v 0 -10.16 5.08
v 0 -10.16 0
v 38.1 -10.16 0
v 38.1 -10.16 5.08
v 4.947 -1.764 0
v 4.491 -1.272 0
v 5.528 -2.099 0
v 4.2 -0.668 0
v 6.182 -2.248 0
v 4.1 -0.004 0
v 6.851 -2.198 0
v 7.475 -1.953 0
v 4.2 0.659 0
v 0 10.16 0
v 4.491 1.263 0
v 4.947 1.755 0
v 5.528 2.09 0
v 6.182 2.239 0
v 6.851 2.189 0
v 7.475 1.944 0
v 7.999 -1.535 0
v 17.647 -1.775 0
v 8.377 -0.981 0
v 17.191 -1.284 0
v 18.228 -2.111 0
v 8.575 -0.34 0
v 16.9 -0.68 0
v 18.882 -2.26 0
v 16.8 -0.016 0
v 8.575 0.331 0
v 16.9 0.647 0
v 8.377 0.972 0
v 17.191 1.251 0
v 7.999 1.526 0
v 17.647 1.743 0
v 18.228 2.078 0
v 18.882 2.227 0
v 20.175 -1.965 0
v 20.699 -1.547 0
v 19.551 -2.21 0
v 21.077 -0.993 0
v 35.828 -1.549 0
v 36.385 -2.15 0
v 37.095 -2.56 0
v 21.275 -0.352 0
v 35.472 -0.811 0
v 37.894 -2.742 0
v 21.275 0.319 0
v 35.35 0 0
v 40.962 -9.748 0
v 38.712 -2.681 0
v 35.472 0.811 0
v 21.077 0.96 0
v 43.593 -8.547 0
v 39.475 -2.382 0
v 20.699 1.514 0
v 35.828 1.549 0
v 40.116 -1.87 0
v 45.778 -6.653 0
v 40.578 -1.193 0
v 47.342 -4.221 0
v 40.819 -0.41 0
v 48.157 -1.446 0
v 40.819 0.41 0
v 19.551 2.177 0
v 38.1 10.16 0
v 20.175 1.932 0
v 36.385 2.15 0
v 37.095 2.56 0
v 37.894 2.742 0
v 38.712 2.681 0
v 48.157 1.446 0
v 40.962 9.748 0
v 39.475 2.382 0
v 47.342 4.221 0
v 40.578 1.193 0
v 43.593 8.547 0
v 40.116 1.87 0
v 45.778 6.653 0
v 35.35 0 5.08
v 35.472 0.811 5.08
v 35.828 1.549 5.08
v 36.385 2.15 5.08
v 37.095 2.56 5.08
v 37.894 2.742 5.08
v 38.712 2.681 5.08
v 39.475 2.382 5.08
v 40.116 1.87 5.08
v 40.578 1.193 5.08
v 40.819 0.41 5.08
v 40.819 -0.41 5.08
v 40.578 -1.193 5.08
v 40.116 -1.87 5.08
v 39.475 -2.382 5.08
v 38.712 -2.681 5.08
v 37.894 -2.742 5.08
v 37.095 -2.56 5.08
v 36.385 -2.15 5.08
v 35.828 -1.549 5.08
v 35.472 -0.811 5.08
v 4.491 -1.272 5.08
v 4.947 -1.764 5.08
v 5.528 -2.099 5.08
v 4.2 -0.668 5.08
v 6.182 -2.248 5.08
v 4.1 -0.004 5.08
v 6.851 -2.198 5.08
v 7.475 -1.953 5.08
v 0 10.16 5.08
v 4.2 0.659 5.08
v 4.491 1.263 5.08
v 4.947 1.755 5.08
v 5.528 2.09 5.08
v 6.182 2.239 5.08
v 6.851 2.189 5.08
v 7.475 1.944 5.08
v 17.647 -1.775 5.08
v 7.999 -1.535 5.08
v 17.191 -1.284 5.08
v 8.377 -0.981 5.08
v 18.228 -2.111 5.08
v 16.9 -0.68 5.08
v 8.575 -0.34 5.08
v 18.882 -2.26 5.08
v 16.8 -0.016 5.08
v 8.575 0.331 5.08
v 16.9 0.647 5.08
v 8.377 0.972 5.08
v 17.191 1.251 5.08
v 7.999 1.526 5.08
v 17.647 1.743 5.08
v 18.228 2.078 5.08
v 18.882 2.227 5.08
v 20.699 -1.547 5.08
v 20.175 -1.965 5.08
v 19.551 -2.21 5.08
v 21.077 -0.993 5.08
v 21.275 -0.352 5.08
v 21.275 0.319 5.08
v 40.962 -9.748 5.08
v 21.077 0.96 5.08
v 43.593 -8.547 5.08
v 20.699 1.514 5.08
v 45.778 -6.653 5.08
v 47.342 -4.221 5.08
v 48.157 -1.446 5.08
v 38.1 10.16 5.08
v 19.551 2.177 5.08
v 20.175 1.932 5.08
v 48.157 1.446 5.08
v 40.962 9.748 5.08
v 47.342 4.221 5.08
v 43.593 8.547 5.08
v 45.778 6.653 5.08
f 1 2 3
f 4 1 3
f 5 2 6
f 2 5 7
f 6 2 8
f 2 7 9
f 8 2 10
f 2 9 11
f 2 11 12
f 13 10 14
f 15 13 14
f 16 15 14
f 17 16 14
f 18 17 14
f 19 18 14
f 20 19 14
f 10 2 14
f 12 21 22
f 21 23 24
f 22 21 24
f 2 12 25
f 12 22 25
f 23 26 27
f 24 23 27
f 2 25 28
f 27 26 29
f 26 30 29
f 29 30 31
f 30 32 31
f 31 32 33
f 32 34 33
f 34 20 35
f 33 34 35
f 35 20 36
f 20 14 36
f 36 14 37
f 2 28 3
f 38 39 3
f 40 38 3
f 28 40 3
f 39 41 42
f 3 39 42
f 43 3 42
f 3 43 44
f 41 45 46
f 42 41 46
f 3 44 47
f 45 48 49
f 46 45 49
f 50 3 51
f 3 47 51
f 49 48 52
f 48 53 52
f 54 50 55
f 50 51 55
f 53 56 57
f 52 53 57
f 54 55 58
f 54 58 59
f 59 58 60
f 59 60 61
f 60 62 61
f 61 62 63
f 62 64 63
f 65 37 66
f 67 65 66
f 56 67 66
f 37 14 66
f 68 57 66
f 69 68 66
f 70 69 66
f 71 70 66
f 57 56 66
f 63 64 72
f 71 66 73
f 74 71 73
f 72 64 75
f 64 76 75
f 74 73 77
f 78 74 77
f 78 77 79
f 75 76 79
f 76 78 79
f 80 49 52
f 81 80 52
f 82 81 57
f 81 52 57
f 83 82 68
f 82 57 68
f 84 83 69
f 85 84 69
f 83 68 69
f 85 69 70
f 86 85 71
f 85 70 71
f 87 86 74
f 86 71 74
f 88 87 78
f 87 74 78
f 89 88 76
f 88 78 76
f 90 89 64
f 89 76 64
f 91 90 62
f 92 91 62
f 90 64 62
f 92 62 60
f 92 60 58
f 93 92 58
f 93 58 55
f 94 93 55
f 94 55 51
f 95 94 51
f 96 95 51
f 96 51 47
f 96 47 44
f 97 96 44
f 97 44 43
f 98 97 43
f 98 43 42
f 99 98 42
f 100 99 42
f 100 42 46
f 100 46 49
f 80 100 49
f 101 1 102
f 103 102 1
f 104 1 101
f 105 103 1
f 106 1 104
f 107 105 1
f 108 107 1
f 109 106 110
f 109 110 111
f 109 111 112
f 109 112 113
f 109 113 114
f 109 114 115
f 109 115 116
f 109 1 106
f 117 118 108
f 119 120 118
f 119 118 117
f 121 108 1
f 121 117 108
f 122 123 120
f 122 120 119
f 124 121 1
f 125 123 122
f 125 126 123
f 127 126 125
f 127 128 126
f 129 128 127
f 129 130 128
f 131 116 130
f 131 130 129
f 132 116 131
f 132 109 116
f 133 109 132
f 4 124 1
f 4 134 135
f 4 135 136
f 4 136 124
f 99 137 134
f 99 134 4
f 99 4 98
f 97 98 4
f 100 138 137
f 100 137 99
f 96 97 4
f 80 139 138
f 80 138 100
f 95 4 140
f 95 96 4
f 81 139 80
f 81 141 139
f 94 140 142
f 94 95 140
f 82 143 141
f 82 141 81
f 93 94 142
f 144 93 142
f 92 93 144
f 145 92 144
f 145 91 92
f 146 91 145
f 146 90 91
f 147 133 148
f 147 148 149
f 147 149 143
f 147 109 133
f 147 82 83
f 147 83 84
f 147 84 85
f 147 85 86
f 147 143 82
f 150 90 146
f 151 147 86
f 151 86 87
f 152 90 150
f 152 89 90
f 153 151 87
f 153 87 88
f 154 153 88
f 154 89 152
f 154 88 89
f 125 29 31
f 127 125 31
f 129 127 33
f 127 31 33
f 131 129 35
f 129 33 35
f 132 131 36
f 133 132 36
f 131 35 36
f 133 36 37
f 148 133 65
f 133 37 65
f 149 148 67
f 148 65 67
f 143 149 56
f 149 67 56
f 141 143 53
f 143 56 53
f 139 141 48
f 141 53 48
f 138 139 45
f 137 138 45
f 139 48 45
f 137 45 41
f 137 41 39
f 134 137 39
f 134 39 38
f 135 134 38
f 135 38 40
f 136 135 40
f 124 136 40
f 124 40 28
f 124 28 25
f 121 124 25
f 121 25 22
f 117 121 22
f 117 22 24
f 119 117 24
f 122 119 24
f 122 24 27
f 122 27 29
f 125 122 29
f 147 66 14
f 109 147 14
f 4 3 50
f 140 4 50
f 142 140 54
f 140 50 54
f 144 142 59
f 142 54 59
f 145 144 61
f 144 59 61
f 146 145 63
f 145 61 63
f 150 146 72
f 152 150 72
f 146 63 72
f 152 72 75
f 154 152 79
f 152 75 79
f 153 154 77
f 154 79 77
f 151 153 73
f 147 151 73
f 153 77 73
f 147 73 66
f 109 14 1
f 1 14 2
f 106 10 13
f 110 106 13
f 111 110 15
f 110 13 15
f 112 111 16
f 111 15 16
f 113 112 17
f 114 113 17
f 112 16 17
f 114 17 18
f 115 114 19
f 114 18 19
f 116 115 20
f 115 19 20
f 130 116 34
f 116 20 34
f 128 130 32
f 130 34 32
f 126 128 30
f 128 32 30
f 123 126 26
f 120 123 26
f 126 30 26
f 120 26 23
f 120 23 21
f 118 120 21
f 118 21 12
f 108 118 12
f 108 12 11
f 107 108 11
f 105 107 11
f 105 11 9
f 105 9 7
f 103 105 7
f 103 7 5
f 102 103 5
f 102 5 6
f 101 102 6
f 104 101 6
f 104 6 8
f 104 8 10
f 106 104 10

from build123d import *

# Parameters (mm, degrees)
BOSS_EXTRUDE1_DEPTH  = 5.08
M5_CLEARANCE_HOLE1_D = 5.5
M4_CLEARANCE_HOLE1_D = 4.5


with BuildPart() as part:
    # Sketch1 → Boss-Extrude1 (new body)
    with BuildSketch(Plane.XY):
        with BuildLine():
            Line((0, 10.16), (0, -10.16))
            Line((0, -10.16), (38.1, -10.16))
            ThreePointArc((38.1, -10.16), (48.26, 0), (38.1, 10.16))
            Line((38.1, 10.16), (0, 10.16))
        make_face()
    extrude(amount=BOSS_EXTRUDE1_DEPTH)

    # M5 Clearance Hole1 (through all)
    with Locations(Plane.XY.offset(5.08)):
        with Locations((38.1, 0)):
            Hole(M5_CLEARANCE_HOLE1_D / 2)

    # M4 Clearance Hole1 (through all)
    with Locations(Plane.XY.offset(5.08)):
        with Locations((19.0499945, -0.016311357), (6.35, -0.00449174)):
            Hole(M4_CLEARANCE_HOLE1_D / 2)


solid = part.part
